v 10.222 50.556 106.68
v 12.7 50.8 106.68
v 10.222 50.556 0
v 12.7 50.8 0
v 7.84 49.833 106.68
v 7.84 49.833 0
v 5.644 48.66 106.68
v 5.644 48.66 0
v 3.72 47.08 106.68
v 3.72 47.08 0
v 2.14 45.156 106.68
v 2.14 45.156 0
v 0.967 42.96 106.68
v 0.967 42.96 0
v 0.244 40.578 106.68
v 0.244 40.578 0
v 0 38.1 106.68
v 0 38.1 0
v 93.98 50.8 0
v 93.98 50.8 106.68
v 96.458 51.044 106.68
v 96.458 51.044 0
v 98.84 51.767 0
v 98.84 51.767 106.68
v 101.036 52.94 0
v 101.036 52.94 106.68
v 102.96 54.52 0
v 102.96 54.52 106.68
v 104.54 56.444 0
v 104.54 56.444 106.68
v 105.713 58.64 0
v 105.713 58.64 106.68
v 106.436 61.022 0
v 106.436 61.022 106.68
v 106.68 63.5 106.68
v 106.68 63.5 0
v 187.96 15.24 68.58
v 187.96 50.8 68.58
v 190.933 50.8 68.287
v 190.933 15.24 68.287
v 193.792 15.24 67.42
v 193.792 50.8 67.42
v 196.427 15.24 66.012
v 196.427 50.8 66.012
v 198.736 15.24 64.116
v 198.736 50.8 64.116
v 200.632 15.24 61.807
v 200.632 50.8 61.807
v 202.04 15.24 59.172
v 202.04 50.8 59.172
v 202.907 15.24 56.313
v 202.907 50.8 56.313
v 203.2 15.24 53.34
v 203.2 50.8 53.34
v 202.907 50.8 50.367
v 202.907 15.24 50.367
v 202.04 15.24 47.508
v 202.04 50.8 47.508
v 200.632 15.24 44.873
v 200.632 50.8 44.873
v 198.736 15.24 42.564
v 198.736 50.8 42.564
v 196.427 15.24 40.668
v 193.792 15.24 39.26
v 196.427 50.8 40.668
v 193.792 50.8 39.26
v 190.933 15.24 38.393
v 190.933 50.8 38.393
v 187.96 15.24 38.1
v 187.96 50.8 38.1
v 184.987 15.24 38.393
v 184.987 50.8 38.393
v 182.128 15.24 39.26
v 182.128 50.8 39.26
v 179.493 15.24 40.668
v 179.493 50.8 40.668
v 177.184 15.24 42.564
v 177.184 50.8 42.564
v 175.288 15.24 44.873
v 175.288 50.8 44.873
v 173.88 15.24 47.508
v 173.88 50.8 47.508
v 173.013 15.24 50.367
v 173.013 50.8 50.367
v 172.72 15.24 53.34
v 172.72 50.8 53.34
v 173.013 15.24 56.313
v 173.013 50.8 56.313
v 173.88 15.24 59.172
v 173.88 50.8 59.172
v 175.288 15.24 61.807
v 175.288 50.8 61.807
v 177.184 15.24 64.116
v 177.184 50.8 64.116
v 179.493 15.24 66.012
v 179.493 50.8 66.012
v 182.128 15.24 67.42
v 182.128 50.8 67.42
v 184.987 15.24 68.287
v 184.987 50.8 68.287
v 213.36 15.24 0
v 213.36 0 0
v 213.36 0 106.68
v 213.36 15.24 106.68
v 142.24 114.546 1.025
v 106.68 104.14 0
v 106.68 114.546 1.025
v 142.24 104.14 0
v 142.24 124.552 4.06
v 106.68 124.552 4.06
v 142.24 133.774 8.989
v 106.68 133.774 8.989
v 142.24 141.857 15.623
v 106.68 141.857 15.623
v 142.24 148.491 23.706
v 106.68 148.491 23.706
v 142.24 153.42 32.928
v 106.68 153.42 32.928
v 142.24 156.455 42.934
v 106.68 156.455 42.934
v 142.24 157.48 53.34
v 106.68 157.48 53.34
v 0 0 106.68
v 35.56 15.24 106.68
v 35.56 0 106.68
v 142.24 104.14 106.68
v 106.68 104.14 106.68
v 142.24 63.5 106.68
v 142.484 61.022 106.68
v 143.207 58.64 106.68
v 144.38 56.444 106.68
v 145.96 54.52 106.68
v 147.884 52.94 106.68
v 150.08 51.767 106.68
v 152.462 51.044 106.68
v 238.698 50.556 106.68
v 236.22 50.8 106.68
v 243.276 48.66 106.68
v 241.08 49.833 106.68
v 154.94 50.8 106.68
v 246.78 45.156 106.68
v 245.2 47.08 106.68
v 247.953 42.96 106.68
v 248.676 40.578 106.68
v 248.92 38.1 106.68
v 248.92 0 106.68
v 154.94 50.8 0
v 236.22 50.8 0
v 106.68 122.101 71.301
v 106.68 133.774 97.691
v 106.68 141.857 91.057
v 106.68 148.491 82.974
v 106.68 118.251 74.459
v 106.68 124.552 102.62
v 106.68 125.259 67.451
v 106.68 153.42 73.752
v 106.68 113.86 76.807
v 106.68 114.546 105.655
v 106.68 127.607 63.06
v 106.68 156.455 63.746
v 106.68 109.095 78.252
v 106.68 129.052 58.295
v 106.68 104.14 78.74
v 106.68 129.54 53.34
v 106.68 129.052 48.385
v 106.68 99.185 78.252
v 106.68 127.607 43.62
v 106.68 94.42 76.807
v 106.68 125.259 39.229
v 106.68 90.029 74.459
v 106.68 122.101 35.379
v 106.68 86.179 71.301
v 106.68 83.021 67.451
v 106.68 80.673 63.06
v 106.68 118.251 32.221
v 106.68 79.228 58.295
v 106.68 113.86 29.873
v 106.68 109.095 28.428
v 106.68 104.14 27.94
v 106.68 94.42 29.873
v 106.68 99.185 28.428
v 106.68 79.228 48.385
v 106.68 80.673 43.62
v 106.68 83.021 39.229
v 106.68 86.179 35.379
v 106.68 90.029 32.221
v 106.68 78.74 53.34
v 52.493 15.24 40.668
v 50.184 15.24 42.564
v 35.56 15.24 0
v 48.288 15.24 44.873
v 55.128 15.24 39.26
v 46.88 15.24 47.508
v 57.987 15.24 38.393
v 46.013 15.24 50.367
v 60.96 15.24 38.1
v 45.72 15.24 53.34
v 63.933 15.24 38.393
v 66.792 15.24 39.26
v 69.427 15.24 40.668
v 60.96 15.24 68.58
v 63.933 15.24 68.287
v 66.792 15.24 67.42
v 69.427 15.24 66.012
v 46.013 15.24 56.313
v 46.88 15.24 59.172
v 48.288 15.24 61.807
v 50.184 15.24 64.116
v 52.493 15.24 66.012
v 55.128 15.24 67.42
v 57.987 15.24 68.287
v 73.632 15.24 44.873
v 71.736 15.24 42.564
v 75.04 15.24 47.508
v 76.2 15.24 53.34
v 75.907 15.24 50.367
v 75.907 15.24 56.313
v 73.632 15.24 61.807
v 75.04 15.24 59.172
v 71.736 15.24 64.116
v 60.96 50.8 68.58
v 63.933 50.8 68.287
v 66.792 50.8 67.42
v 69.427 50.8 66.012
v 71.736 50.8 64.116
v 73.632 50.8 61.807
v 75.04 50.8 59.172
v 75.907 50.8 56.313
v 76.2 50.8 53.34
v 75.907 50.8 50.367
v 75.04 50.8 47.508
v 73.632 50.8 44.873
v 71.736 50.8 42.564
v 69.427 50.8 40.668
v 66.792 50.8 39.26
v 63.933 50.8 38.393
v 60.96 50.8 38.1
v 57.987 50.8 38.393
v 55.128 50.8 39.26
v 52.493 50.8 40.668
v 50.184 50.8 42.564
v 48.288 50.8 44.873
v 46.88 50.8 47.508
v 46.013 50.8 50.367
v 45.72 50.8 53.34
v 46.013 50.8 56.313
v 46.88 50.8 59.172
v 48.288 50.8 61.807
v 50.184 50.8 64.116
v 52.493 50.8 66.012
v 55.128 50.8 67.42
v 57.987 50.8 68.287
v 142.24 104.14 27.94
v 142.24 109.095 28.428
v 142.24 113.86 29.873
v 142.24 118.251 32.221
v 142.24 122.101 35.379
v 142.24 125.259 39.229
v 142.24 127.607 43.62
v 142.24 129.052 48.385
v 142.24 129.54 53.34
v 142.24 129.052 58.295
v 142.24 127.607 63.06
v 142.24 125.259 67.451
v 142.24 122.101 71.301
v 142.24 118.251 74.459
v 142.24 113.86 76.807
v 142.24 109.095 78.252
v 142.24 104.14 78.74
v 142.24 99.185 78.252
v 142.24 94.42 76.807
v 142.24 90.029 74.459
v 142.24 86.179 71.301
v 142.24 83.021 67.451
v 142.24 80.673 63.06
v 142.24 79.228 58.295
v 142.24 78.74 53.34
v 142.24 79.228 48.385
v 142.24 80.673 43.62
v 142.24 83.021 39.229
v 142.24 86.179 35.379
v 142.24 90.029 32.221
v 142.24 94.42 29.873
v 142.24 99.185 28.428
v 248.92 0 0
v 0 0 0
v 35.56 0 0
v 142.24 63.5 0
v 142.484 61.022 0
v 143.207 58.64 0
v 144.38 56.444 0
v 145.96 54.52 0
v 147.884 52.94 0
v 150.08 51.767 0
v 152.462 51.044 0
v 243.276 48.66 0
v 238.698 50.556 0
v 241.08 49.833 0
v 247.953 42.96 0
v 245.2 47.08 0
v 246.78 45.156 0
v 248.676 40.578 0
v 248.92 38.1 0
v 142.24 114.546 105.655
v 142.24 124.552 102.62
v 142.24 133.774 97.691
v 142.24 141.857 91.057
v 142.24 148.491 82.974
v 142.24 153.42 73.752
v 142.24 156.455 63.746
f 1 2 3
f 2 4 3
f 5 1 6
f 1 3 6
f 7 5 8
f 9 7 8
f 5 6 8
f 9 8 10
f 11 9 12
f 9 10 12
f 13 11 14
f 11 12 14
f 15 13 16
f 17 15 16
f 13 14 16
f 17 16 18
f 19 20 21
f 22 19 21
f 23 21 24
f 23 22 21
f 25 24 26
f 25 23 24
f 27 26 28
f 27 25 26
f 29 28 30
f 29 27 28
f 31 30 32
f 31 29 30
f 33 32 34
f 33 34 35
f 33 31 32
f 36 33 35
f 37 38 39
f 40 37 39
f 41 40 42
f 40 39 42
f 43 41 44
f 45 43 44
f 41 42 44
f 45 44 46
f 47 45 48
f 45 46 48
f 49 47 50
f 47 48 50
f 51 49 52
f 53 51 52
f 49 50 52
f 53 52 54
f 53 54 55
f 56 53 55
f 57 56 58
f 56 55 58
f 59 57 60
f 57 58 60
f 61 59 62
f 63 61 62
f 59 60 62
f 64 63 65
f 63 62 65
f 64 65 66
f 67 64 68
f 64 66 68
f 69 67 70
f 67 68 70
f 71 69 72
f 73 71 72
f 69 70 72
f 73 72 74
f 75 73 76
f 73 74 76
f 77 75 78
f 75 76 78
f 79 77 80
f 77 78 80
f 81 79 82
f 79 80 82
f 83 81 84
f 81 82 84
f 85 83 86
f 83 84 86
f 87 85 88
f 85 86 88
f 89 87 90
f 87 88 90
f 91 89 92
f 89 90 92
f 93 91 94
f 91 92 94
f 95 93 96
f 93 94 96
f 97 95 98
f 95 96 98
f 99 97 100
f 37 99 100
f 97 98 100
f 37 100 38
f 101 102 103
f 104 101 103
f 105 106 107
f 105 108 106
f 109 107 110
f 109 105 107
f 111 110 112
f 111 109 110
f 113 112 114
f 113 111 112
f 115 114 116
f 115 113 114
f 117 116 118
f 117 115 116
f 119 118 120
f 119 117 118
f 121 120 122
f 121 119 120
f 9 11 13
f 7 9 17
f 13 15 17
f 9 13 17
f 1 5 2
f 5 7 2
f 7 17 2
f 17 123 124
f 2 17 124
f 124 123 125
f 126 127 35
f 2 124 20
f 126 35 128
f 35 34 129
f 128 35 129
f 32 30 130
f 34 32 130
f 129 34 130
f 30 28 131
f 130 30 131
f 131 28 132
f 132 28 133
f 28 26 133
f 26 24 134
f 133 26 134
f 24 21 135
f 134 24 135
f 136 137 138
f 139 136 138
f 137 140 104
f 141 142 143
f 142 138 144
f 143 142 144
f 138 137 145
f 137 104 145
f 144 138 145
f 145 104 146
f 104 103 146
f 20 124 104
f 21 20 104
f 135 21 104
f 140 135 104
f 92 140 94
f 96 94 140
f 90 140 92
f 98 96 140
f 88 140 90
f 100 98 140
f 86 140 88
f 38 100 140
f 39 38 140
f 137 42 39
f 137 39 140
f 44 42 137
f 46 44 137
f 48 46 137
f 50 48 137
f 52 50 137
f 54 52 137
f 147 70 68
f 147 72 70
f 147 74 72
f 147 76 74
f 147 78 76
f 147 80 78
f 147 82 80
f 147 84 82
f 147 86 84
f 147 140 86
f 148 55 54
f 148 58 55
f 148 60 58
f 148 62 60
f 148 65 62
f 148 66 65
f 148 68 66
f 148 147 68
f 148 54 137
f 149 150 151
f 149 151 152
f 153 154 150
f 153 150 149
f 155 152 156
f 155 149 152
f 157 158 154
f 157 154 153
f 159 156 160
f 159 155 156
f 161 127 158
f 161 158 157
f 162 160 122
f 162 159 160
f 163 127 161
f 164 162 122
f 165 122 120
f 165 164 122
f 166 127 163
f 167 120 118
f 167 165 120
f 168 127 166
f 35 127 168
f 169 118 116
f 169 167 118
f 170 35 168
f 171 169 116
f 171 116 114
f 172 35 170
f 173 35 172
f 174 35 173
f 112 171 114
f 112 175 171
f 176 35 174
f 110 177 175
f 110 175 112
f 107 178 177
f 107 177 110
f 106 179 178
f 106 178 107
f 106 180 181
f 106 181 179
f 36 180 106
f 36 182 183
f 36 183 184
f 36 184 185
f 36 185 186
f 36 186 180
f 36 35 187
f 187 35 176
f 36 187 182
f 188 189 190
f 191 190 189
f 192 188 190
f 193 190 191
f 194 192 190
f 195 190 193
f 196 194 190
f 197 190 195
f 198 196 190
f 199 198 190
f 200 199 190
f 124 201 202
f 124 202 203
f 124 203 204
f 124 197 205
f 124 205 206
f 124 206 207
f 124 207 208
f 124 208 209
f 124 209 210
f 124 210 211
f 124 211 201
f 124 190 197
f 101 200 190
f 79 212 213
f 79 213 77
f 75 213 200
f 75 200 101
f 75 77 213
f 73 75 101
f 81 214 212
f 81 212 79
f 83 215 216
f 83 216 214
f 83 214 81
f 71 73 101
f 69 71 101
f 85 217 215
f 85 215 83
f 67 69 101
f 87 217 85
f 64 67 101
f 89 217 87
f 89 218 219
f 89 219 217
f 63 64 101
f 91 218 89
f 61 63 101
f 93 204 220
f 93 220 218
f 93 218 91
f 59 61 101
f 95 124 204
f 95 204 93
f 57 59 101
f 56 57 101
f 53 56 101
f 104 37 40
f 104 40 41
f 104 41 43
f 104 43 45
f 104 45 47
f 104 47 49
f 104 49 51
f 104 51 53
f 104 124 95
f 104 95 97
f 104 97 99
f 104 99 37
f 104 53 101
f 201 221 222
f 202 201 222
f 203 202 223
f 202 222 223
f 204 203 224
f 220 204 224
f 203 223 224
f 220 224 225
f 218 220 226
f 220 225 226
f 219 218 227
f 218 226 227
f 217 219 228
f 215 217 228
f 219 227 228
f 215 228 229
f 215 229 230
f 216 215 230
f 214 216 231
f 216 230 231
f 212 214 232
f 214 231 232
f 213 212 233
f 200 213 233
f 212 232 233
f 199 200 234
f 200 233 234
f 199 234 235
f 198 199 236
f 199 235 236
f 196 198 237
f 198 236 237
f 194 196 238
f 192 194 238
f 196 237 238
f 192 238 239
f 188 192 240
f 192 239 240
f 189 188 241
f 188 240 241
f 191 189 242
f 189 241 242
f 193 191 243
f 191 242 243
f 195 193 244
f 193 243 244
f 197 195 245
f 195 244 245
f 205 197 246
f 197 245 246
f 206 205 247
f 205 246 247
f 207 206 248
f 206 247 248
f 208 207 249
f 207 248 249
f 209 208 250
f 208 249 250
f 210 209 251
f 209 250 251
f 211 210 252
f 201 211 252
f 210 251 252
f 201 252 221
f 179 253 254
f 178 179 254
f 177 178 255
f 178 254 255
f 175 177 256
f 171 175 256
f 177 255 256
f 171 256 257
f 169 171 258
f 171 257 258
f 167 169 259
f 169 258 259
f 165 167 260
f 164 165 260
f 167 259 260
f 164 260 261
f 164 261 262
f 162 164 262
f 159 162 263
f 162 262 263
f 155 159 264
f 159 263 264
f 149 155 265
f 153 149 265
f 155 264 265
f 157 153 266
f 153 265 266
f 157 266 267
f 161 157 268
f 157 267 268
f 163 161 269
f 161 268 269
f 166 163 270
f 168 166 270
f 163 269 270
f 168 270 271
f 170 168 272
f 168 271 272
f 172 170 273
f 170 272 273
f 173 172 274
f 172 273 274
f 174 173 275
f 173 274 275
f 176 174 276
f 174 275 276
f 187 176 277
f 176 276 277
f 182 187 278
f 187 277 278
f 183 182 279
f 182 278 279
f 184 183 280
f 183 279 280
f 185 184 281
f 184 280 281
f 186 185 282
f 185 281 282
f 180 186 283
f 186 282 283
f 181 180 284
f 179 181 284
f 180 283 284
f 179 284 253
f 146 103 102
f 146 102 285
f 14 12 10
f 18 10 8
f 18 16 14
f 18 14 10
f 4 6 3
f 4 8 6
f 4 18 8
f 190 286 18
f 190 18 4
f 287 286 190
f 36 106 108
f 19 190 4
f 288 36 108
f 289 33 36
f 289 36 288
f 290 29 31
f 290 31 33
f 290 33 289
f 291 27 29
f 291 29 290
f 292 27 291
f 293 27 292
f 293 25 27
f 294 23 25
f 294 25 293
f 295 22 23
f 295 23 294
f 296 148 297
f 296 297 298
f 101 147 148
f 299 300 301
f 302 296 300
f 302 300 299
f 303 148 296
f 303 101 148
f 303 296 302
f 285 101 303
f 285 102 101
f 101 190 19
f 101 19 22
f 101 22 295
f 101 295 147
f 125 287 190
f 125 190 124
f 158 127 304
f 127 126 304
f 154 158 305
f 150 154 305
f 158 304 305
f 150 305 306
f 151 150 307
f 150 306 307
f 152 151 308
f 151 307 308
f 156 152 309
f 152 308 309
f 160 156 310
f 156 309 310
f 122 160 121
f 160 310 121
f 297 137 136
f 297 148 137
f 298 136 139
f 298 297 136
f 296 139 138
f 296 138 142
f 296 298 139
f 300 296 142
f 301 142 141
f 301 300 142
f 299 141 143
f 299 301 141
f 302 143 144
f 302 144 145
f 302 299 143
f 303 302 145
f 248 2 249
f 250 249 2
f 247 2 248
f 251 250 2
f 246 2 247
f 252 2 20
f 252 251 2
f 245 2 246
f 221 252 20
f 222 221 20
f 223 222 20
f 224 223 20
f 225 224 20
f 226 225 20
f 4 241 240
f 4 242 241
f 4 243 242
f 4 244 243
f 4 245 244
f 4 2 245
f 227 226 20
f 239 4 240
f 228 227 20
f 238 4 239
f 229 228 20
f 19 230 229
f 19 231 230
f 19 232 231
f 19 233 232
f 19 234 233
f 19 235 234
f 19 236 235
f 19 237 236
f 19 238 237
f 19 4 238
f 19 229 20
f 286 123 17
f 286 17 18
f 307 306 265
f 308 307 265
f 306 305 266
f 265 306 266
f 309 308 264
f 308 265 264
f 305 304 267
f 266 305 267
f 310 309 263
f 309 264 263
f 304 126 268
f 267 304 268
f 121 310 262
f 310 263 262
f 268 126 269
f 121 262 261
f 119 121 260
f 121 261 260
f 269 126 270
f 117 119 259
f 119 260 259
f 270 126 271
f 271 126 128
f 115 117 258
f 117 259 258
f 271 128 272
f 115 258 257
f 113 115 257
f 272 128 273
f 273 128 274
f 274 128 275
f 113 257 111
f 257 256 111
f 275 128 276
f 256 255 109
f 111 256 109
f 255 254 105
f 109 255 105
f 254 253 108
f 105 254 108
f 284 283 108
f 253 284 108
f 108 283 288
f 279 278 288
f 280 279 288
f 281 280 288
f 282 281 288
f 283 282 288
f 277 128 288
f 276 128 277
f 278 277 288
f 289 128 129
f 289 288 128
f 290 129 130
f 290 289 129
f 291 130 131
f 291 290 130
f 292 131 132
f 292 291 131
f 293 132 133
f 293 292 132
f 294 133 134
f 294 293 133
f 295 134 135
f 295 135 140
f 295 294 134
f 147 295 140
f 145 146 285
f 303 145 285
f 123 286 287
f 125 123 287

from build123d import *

# Parameters (mm, degrees)
SKETCH1_W           = 248.92
SKETCH1_H           = 106.68
BOSS_EXTRUDE1_DEPTH = 50.8
SKETCH2_W           = 177.8
SKETCH2_H           = 106.68
CUT_EXTRUDE1_DEPTH  = 15.24
SKETCH3_R           = 15.24
CUT_EXTRUDE3_DEPTH  = 35.56
SKETCH3_4_W         = 35.56
SKETCH3_4_H         = 106.68
BOSS_EXTRUDE2_DEPTH = 106.68
SKETCH4_R           = 25.4
CUT_EXTRUDE4_DEPTH  = 35.56
FILLET1_R           = 53.34
FILLET2_R           = 12.7
FILLET3_R           = 12.7


with BuildPart() as part:
    # Sketch1 → Boss-Extrude1 (new body)
    with BuildSketch(Plane(origin=(0, 0, 0), x_dir=(1, 0, 0), z_dir=(0, 1, 0))):
        with Locations((124.46, -53.34)):
            Rectangle(SKETCH1_W, SKETCH1_H)
    extrude(amount=BOSS_EXTRUDE1_DEPTH)

    # Sketch2 → Cut-Extrude1 (cut)
    with BuildSketch(Plane.XZ):
        with Locations((124.46, 53.34)):
            Rectangle(SKETCH2_W, SKETCH2_H)
    extrude(amount=-CUT_EXTRUDE1_DEPTH, mode=Mode.SUBTRACT)

    # Sketch3 → Cut-Extrude3 (cut)
    with BuildSketch(Plane(origin=(0, 50.8, 0), x_dir=(1, 0, 0), z_dir=(0, 1, 0))):
        with Locations(Location((60.96, -53.34, 0), (0, 0, 270))):
            Circle(SKETCH3_R)
        with Locations(Location((187.96, -53.34, 0), (0, 0, 270))):
            Circle(SKETCH3_R)
    extrude(amount=-CUT_EXTRUDE3_DEPTH, mode=Mode.SUBTRACT)

    # Sketch3<4> → Boss-Extrude2 (add)
    with BuildSketch(Plane(origin=(0, 50.8, 0), x_dir=(1, 0, 0), z_dir=(0, 1, 0))):
        with Locations((124.46, -53.34)):
            Rectangle(SKETCH3_4_W, SKETCH3_4_H)
    extrude(amount=BOSS_EXTRUDE2_DEPTH)

    # Sketch4 → Cut-Extrude4 (cut)
    with BuildSketch(Plane(origin=(142.24, 0, 0), x_dir=(0, 0, -1), z_dir=(1, 0, 0))):
        with Locations((-53.34, 104.14)):
            Circle(SKETCH4_R)
    extrude(amount=-CUT_EXTRUDE4_DEPTH, mode=Mode.SUBTRACT)

    # Fillet1
    fillet1_edges = [part.edges().sort_by_distance(p)[0] for p in [
        (124.46, 157.48, 106.68),
        (124.46, 157.48, 0),
    ]]
    fillet(fillet1_edges, radius=FILLET1_R - 0.0001)  # a hair under: the kernel refuses the full size

    # Fillet2
    fillet2_edges = [part.edges().sort_by_distance(p)[0] for p in [
        (248.92, 50.8, 53.34),
        (0, 50.8, 53.34),
    ]]
    fillet(fillet2_edges, radius=FILLET2_R)

    # Fillet3
    fillet3_edges = [part.edges().sort_by_distance(p)[0] for p in [
        (106.68, 50.8, 53.34),
        (142.24, 50.8, 53.34),
    ]]
    fillet(fillet3_edges, radius=FILLET3_R)


solid = part.part
